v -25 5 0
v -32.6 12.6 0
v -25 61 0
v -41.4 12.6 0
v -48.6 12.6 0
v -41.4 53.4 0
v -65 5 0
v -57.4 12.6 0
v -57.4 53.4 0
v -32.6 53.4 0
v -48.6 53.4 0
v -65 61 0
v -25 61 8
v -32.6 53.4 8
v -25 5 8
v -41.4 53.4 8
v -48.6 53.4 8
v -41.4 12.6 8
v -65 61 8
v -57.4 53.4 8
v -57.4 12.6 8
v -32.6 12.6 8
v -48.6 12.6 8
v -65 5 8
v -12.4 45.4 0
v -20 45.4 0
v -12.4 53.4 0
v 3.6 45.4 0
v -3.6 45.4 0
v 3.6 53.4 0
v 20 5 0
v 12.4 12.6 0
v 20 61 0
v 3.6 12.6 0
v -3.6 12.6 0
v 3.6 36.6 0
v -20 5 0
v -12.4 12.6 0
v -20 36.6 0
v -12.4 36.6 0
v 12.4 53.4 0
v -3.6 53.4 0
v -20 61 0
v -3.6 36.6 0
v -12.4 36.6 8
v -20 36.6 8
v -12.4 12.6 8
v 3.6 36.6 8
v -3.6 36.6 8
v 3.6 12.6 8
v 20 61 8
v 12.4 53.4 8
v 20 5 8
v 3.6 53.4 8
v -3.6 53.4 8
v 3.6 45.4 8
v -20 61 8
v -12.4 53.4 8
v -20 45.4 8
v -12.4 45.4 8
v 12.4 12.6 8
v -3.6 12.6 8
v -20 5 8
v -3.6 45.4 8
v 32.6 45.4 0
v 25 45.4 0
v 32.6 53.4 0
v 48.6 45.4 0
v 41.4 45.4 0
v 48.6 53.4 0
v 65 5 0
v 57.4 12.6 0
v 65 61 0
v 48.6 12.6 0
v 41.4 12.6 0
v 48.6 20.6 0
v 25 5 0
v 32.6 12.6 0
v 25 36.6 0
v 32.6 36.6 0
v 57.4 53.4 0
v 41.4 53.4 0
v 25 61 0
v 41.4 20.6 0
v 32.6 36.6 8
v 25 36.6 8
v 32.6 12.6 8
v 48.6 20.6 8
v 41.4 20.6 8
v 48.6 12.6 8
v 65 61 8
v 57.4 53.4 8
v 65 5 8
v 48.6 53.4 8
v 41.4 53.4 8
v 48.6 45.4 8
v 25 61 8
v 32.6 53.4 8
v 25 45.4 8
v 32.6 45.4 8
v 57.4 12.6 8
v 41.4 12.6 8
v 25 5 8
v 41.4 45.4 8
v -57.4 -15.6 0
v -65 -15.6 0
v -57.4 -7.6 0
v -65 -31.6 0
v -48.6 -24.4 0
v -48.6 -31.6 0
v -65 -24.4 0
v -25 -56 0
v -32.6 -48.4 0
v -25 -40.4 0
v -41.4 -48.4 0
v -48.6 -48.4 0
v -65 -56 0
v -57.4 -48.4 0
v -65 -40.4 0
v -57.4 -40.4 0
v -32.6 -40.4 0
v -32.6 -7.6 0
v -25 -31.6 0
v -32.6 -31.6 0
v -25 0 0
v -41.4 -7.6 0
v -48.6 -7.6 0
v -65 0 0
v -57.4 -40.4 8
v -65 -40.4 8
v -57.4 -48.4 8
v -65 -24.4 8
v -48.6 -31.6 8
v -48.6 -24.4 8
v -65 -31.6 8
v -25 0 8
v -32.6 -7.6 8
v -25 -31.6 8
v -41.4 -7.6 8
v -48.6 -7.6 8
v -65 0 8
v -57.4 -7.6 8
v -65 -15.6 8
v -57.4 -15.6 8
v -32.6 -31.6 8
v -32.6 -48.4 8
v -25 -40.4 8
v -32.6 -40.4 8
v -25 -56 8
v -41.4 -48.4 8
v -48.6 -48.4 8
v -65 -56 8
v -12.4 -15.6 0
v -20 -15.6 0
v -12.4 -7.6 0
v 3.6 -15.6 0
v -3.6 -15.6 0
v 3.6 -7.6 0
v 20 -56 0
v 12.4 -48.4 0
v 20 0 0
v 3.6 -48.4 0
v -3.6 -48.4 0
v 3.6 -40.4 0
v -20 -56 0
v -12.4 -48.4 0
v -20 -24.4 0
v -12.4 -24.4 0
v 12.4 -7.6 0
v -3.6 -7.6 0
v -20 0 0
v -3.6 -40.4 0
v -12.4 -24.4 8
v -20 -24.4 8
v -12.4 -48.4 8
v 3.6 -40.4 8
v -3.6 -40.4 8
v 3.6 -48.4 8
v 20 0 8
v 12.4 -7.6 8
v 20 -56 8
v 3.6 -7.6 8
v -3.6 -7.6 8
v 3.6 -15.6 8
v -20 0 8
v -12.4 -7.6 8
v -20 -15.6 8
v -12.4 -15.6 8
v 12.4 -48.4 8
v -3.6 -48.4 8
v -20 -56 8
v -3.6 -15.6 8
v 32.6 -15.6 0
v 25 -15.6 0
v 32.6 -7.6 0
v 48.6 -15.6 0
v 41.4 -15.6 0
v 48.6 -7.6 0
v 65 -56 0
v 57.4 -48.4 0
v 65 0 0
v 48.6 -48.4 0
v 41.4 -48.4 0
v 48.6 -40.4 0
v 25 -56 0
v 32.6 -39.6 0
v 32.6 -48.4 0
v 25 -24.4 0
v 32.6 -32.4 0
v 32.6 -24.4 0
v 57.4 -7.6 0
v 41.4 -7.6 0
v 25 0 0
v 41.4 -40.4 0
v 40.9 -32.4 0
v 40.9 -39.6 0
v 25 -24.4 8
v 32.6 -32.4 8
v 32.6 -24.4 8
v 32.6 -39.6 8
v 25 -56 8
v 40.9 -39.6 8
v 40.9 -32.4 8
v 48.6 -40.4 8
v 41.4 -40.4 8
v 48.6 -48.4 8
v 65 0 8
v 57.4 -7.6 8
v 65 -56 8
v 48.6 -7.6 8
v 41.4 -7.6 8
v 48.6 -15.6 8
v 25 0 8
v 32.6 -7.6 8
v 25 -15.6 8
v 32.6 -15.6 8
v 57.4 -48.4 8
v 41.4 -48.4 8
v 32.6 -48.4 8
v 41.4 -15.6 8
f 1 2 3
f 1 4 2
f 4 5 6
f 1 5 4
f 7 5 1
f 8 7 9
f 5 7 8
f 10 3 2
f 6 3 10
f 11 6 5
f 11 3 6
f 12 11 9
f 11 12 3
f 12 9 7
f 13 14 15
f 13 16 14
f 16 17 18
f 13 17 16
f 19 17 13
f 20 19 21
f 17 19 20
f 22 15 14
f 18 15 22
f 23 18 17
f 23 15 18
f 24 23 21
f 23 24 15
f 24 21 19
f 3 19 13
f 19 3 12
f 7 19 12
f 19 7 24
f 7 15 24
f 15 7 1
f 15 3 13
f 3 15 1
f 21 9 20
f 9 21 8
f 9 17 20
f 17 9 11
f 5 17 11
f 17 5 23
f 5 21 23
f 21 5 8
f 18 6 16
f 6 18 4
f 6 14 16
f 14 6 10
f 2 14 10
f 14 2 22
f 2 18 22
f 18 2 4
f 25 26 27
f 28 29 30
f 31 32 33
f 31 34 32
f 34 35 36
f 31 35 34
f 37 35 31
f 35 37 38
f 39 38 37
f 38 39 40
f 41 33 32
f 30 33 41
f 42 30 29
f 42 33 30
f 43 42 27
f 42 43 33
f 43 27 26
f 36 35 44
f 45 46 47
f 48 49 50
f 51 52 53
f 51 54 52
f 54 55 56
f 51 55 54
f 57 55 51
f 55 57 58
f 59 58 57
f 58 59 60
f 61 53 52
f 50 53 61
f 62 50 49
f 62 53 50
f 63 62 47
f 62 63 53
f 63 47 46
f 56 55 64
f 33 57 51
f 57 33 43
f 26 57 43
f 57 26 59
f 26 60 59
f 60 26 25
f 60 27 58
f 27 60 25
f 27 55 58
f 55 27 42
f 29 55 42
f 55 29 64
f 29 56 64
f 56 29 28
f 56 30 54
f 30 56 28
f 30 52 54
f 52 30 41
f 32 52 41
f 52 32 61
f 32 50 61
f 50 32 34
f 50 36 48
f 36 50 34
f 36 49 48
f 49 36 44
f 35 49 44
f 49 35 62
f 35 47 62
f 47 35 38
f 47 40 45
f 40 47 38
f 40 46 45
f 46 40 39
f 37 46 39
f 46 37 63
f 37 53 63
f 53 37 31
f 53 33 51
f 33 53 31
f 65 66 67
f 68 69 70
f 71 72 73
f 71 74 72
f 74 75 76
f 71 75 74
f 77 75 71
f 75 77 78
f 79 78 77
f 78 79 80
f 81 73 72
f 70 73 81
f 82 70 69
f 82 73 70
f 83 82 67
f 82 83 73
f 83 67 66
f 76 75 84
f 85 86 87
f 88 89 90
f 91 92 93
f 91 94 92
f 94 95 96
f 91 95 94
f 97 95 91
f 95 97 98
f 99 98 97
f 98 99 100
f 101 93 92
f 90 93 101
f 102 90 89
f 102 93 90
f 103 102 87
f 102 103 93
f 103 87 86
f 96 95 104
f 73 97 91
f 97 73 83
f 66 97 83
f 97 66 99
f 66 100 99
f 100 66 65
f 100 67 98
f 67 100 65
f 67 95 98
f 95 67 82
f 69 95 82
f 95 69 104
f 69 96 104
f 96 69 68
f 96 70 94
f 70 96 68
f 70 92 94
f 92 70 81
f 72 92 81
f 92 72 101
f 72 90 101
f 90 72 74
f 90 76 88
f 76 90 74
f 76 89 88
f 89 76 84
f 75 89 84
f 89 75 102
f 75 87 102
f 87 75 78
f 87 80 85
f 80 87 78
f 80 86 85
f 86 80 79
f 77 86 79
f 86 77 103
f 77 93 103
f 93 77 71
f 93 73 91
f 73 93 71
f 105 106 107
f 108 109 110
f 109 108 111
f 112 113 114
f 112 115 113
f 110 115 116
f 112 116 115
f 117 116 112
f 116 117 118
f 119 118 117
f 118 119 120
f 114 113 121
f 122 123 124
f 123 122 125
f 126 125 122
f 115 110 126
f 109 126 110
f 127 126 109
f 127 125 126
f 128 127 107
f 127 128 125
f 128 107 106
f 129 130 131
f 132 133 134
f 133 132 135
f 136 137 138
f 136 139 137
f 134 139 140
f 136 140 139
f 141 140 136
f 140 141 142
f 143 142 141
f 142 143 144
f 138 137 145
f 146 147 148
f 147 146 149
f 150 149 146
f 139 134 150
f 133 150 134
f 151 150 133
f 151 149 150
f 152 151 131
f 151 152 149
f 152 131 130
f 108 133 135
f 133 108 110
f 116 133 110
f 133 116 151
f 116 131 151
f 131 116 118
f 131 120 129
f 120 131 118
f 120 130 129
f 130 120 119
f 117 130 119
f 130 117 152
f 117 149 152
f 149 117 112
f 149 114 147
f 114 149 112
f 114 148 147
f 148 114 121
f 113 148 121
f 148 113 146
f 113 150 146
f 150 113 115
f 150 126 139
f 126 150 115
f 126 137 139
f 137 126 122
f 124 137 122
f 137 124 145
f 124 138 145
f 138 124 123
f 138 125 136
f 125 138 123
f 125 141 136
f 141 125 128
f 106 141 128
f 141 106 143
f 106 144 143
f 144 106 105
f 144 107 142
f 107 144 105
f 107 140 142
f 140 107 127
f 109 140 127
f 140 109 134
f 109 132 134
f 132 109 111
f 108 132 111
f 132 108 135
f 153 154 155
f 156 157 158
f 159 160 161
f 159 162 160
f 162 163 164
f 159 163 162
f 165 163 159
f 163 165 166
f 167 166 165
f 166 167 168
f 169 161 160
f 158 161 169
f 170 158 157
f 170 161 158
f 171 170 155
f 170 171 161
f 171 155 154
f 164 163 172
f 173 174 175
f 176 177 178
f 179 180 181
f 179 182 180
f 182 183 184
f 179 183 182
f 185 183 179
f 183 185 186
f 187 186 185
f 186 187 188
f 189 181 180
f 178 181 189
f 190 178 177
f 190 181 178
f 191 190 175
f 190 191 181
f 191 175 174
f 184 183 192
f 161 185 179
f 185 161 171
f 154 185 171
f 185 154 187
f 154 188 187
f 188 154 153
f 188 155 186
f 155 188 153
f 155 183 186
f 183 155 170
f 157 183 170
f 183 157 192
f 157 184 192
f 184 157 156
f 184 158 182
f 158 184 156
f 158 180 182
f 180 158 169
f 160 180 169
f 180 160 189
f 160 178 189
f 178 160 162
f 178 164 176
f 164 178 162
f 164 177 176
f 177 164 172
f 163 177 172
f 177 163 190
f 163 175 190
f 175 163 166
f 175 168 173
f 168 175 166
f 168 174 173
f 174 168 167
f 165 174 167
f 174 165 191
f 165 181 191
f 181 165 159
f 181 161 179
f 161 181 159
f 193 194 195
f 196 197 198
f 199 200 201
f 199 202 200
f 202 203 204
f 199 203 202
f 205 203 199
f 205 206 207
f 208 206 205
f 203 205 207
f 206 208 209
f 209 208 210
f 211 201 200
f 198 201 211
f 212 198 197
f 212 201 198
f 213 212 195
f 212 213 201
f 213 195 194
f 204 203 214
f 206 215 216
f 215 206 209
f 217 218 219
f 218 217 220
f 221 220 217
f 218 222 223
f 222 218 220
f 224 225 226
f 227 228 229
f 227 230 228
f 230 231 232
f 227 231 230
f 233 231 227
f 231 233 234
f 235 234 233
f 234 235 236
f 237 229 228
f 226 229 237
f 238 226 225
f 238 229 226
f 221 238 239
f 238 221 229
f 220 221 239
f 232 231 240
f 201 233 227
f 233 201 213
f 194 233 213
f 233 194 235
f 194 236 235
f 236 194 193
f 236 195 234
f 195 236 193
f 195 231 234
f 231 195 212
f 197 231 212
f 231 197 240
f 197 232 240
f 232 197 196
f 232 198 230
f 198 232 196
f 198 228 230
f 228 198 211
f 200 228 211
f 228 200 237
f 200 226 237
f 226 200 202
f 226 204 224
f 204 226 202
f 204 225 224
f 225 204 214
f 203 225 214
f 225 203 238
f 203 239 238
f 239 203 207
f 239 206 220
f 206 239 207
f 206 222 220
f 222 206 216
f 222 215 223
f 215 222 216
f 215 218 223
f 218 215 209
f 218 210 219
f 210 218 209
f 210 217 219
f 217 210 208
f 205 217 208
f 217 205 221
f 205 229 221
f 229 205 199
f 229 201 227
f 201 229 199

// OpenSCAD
// [FL_INDEX: keywords="openscad, 3d_parametric, Gordian_Knot_3D_Puzzle, csg_solid" | COT="Parametric OpenSCAD design from 3DCodeverse"]
// Title: Gordian Knot 3D Puzzle

// "Gordian Knot" 3D puzzle.
// Len Trigg <lenbok@gmail.com>
// Modelled off the designs at: http://www.cs.tau.ac.il/~efif/applications/puzzles/knot/
// If you get stuck, see the animation at: http://www.youtube.com/watch?v=xNtNQRTdxps

// Size of one "unit" in mm.
basewidth = 8;  // [5:20]
// Tolerance between parts, in tenths of a mm.
tolerance = 4; // [0:40]

width=basewidth*5;
height=basewidth*7;
tolerance1 = tolerance/10;
tolerance2 = tolerance1*2;
echo("Each piece is ",width," by ",height);

module green2d() {
    difference() {
        square([width, height]);
        translate([basewidth-tolerance1, basewidth-tolerance1]) square([basewidth+tolerance2, basewidth*5+tolerance2]);
        translate([basewidth*3-tolerance1, basewidth-tolerance1]) square([basewidth+tolerance2, basewidth*5+tolerance2]);
    }
}
module yellow2d() {
    difference() {
        square([width, height]);
        translate([basewidth-tolerance1, basewidth-tolerance1]) square([basewidth+tolerance2, basewidth*5+tolerance2]);
        translate([basewidth*3-tolerance1, basewidth-tolerance1]) square([basewidth+tolerance2, basewidth*5+tolerance2]);
        translate([-0.1, basewidth*4-tolerance1]) square([basewidth*3+0.2, basewidth+tolerance2]);
    }
}
module opiece2d() {
    difference() {
        square([width, height]);
        translate([basewidth-tolerance1, basewidth-tolerance1]) square([basewidth+tolerance2, basewidth*5+tolerance2]);
        translate([basewidth*3-tolerance1, basewidth-tolerance1]) square([basewidth+tolerance2, basewidth*5+tolerance2]);
        translate([basewidth*2-0.1, basewidth*2-tolerance1]) square([basewidth+0.2, basewidth*3+tolerance2]);
        translate([-0.1, basewidth*4-tolerance1]) square([basewidth*3+0.2, basewidth+tolerance2]);
    }
}
module red2d() {
    difference() {
        square([width, height]);
        translate([basewidth-tolerance1, basewidth-tolerance1]) square([basewidth+tolerance2, basewidth*2+tolerance2]);
        translate([basewidth-tolerance1, basewidth*4-tolerance1]) square([basewidth+tolerance2, basewidth*2+tolerance2]);
        translate([basewidth*3-tolerance1, basewidth-tolerance1]) square([basewidth+tolerance2, basewidth*5+tolerance2]);
        translate([-0.1, basewidth*4-tolerance1]) square([basewidth+0.2, basewidth+tolerance2]);
        translate([-0.1, basewidth*2-tolerance1]) square([basewidth+0.2, basewidth+tolerance2]);
        translate([basewidth*3, basewidth*2-tolerance1]) square([basewidth*2+0.2, basewidth+tolerance2]);
    }
}
module blue2d() {
    difference() {
        square([width, height]);
        translate([basewidth-tolerance1, basewidth-tolerance1]) square([basewidth+tolerance2, basewidth+tolerance2]);
        translate([basewidth-tolerance1, basewidth*3-tolerance1]) square([basewidth+tolerance2, basewidth*3+tolerance2]);
        translate([basewidth*3-tolerance1, basewidth-tolerance1]) square([basewidth+tolerance2, basewidth*5+tolerance2]);
        translate([basewidth*2-0.1, basewidth*2-tolerance1]) square([basewidth+0.2, basewidth*3+tolerance2]);
        translate([-0.1, basewidth*4-tolerance1]) square([basewidth*3+0.2, basewidth+tolerance2]);
    }
}

module green() {
    color([0,1,0]) linear_extrude(height=basewidth) green2d();
}
module yellow() {
    color([1,1,0]) linear_extrude(height=basewidth) yellow2d();
}
module orange() {
    color([1,0.5,0]) linear_extrude(height=basewidth) opiece2d();
}
module purple() {
    color([1,0,1]) linear_extrude(height=basewidth) opiece2d();
}
module red() {
    color([1,0,0]) linear_extrude(height=basewidth) red2d();
}
module blue() {
    color([0,0,1]) linear_extrude(height=basewidth) blue2d();
}

module printall() {
    translate([-width*3/2-5, 5, 0]) green();
    translate([-width*1/2, 5, 0]) yellow();
    translate([width*1/2+5, 5, 0]) orange();
    translate([-width*3/2-5, -height, 0]) red();
    translate([-width*1/2, -height, 0]) purple();
    translate([width*1/2+5, -height, 0]) blue();
}

// Roughly how it should look when assembled, but the pieces may be in different orientations
module assembled() {
    translate([0, 0, basewidth*2]) {
        translate([0, 0, 0]) red();
        translate([0, 0, basewidth*2]) yellow();
    }
    translate([basewidth*1,basewidth,0]) rotate([90,0,90]) {
        translate([0, 0, 0]) purple();
        translate([0, 0, basewidth*2]) green();
    }
    translate([-basewidth,basewidth*5,basewidth*6]) rotate([-90,90,180]) {
        translate([0, 0, 0]) orange();
        translate([0, 0, basewidth*2]) blue();
    }
}
//assembled();
//translate([-width/2,-height/2,0]) blue();
printall();
